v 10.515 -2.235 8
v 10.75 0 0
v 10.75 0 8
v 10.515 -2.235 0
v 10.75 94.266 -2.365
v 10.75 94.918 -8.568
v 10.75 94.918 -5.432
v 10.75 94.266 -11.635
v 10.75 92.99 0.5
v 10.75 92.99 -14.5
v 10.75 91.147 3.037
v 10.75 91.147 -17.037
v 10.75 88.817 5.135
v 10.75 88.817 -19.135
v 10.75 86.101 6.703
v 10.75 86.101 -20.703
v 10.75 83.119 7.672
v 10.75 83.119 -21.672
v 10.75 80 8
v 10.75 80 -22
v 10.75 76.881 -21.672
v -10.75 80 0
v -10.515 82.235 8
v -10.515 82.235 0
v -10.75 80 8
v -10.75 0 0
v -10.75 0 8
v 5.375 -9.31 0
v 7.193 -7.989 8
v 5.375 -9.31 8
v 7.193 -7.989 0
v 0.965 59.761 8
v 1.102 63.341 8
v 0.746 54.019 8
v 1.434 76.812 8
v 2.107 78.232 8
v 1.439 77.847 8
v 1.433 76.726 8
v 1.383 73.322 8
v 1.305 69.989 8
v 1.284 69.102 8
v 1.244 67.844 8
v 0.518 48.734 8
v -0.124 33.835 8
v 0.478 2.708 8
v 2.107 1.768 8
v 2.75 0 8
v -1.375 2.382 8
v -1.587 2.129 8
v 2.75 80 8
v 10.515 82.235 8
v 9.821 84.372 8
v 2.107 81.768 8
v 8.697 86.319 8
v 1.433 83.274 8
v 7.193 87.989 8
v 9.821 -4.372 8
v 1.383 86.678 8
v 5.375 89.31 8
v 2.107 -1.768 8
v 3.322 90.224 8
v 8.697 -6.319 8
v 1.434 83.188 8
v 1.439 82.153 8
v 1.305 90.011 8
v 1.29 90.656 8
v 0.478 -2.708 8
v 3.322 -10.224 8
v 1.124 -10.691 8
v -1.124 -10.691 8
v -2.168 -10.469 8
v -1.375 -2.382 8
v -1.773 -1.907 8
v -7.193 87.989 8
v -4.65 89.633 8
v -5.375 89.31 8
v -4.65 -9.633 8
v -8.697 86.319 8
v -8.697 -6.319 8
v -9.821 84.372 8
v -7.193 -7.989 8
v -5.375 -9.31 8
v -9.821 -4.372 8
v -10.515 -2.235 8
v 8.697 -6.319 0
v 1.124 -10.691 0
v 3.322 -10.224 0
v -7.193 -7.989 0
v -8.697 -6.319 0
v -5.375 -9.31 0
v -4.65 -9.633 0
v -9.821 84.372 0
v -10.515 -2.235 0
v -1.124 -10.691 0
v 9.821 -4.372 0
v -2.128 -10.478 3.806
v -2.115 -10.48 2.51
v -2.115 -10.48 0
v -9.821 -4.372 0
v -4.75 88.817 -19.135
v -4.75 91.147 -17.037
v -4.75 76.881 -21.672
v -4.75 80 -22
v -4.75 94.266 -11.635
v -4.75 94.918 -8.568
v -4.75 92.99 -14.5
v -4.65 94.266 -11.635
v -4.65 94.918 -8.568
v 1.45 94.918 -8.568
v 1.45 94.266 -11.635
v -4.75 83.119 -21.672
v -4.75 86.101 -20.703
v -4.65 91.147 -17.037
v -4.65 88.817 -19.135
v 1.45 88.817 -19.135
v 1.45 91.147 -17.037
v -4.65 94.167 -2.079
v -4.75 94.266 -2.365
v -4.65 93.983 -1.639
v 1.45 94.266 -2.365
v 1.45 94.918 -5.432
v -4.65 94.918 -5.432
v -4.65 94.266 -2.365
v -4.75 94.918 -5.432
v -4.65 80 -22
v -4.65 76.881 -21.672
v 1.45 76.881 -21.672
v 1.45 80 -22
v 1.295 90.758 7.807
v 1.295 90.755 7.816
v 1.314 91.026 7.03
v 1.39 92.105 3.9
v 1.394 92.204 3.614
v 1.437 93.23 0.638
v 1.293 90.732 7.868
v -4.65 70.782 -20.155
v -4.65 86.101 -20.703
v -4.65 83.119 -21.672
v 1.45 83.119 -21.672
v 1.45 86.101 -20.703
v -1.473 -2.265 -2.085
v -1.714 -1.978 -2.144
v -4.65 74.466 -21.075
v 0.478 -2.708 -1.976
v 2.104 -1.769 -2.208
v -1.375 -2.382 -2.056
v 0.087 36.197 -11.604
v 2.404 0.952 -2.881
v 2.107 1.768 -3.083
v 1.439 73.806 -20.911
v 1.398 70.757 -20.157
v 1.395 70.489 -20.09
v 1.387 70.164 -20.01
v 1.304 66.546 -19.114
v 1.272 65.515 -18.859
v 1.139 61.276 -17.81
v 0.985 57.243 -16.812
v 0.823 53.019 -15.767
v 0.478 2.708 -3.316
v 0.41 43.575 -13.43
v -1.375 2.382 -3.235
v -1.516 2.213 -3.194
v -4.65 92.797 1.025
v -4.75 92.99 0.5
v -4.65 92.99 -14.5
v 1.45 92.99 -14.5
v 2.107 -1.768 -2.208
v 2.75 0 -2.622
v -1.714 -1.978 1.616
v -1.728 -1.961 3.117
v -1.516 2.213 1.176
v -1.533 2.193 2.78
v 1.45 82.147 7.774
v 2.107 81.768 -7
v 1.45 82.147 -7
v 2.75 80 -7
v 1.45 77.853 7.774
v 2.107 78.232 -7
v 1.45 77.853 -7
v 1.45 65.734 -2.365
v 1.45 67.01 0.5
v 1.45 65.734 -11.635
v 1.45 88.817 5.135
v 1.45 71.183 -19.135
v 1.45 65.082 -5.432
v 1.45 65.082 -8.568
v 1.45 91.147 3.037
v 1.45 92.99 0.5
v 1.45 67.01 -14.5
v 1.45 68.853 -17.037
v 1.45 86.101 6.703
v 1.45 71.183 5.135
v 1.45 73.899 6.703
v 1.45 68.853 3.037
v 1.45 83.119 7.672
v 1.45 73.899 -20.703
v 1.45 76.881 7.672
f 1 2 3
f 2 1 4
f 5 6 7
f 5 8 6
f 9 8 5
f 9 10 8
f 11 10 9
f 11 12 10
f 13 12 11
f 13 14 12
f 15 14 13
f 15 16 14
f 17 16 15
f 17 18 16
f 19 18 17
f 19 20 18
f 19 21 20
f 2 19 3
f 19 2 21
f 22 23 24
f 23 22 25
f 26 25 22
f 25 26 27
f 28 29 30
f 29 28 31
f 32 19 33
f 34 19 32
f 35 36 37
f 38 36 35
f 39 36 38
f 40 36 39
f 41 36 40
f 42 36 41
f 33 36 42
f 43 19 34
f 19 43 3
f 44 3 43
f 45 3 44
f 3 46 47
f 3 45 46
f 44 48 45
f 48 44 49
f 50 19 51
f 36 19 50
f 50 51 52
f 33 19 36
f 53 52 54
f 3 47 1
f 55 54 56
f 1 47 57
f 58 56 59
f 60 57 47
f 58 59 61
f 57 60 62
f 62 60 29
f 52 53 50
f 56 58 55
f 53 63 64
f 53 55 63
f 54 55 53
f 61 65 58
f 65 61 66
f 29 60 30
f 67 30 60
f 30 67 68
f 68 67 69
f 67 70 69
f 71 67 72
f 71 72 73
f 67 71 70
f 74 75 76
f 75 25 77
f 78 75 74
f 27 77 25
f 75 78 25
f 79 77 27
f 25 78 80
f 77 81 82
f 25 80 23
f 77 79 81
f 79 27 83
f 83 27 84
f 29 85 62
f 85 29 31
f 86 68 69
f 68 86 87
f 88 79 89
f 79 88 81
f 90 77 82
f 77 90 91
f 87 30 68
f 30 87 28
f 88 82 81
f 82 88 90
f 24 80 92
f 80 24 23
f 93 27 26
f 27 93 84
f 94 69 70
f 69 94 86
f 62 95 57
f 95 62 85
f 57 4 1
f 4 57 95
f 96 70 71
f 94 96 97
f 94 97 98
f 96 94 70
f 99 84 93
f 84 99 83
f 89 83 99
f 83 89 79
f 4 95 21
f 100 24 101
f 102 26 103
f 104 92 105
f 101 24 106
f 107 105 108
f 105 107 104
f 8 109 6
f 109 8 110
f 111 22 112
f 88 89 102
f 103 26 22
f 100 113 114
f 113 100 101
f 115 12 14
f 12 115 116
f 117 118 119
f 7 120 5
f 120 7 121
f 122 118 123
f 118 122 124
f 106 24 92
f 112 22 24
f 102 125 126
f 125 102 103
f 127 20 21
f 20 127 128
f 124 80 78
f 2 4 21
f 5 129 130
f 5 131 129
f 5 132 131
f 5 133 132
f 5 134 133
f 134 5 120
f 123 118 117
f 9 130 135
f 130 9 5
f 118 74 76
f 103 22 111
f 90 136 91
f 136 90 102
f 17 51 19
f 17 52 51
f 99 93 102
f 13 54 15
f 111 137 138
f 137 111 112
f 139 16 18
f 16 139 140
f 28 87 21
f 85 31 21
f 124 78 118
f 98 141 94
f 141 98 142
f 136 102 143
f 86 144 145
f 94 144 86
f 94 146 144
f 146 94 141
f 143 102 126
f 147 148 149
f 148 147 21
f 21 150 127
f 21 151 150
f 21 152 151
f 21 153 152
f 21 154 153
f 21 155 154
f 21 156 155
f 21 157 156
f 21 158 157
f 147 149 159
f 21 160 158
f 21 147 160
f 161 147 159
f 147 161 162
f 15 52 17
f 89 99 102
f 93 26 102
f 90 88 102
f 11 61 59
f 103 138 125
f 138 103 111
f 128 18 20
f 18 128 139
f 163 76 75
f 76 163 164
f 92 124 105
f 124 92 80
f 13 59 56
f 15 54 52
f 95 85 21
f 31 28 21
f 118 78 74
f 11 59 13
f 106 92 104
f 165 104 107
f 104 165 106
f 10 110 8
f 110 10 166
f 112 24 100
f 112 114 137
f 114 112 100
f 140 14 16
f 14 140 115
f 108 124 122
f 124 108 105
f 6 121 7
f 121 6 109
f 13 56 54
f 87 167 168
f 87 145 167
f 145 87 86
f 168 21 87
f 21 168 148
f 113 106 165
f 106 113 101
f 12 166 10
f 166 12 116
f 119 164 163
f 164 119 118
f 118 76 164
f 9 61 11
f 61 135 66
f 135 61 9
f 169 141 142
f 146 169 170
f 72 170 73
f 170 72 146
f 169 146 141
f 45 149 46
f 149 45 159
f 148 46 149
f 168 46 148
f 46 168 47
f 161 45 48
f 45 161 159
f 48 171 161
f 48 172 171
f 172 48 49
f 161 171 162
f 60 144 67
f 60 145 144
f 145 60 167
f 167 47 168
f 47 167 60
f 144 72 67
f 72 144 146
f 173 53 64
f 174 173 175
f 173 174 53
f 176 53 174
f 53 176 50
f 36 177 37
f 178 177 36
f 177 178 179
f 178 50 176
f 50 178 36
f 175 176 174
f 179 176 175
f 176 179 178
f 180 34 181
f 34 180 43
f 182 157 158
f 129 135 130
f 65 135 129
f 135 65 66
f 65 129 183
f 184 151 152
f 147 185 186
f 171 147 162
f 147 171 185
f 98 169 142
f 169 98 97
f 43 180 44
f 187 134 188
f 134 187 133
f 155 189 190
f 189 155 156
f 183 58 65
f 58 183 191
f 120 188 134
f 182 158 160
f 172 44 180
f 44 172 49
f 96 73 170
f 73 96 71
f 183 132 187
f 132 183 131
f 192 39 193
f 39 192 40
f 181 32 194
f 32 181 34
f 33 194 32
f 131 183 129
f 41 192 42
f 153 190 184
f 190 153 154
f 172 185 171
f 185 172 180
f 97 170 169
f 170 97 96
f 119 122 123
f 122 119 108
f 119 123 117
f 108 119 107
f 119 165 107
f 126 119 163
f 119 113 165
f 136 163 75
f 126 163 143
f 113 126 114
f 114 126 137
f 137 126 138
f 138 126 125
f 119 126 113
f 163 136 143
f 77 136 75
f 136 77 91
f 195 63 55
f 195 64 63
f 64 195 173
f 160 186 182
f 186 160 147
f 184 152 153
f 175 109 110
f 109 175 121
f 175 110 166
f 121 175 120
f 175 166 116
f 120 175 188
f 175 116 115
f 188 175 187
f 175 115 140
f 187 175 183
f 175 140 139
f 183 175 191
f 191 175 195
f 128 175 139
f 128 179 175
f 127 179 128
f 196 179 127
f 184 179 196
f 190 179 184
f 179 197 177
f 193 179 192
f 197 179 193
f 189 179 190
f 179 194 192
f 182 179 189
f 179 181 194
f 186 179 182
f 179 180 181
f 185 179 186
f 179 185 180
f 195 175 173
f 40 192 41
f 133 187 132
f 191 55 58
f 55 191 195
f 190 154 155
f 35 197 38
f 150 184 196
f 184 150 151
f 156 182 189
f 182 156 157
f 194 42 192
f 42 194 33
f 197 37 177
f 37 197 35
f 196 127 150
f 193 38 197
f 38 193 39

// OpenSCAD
plate_bolt=5.5;
plate_wall=8;
plate_walll=plate_wall*2;
plate_outer=plate_bolt+plate_walll;
plate_head=14;
plate_h=plate_wall;

mount_bolt=10;
mount_wall=10;
mount_walll=mount_wall*2;
mount_outer=mount_bolt+mount_walll;

plate_x_gap=-180;
plate_y_gap=80;
pad=0.1;
padd=pad*2;
thread_pad=2;
mount_h=plate_bolt+thread_pad*2;

mount_x=-mount_h/2;
mount_y=0;
mount_z=0;

fudge_left=50;
fudge_right=50;
plate_bolt_h=mount_outer/2;


module plate_mount() {
    hull() {
        cylinder(d=plate_outer,h=plate_h);
        translate([0,plate_y_gap,0])
        cylinder(d=plate_outer,h=plate_h);
    }
}

module mount_positive() {
    translate([mount_x,mount_y,mount_z])
    translate([0,plate_y_gap,-mount_outer/2+plate_h])
    rotate([0,90,0])
    cylinder(d=mount_outer,h=mount_h+(plate_outer-mount_h)/2);
}

module mount_negative() {
    translate([mount_x,mount_y,mount_z])
    translate([0,plate_y_gap,-mount_outer/2+plate_h])
    rotate([0,90,0])
        //cylinder(d=mount_bolt,h=mount_h+padd+fudge_right+fudge_left);
        //translate([0,0,fudge_right+mount_h])
        //cylinder(d1=mount_outer,d2=mount_outer+fudge_left*2+plate_y_gap*2,h=fudge_left);
        translate([0,0,-plate_outer/2+pad+(plate_outer-mount_h)/2+mount_h/2])
        #cylinder(d2=mount_outer,d1=mount_outer+fudge_right*2+plate_y_gap*2,h=pad+(plate_outer-mount_h)/2);
}

module plate_to_shadow() {
    hull() {
        shadow();
        plate_mount();
    }
}

module shadow() {
    translate([mount_x,-mount_outer/2+plate_y_gap+mount_y,0])
    cube([mount_h,mount_outer/2,plate_h]);
}


module shadow_to_mount() {
    hull() {
        mount_positive();
        difference() {
            plate_to_shadow();
            translate([mount_x+mount_h/2+fudge_left,-plate_outer,-pad])
            cube([1000,1000,50]);
        }
    }
}

module plate_bolt() {
    translate([0,0,mount_z-mount_outer]) {
        cylinder(d=plate_bolt,h=plate_h+padd+mount_outer-mount_z);
        translate([0,0,-plate_h-pad])
        //cylinder(d2=plate_head,d1=plate_head+plate_h+mount_outer-mount_z,h=plate_h+mount_outer-mount_z);
        cylinder(d=plate_head,h=plate_h+mount_outer-mount_z);
    }
}

module plate_negative() {
    translate([0,0,-pad]) {
        translate([0,0,-plate_bolt_h+plate_h+pad])
        cylinder(d=plate_bolt,h=plate_bolt_h+pad);
        translate([0,plate_y_gap,-plate_bolt_h+plate_h+pad])
        cylinder(d=plate_bolt,h=plate_bolt_h+pad);
    }
}

module assembled() {
    difference() {
        union() {
            plate_to_shadow();
            shadow_to_mount();
        }
        mount_negative();
        plate_negative();
    }
}

assembled();
